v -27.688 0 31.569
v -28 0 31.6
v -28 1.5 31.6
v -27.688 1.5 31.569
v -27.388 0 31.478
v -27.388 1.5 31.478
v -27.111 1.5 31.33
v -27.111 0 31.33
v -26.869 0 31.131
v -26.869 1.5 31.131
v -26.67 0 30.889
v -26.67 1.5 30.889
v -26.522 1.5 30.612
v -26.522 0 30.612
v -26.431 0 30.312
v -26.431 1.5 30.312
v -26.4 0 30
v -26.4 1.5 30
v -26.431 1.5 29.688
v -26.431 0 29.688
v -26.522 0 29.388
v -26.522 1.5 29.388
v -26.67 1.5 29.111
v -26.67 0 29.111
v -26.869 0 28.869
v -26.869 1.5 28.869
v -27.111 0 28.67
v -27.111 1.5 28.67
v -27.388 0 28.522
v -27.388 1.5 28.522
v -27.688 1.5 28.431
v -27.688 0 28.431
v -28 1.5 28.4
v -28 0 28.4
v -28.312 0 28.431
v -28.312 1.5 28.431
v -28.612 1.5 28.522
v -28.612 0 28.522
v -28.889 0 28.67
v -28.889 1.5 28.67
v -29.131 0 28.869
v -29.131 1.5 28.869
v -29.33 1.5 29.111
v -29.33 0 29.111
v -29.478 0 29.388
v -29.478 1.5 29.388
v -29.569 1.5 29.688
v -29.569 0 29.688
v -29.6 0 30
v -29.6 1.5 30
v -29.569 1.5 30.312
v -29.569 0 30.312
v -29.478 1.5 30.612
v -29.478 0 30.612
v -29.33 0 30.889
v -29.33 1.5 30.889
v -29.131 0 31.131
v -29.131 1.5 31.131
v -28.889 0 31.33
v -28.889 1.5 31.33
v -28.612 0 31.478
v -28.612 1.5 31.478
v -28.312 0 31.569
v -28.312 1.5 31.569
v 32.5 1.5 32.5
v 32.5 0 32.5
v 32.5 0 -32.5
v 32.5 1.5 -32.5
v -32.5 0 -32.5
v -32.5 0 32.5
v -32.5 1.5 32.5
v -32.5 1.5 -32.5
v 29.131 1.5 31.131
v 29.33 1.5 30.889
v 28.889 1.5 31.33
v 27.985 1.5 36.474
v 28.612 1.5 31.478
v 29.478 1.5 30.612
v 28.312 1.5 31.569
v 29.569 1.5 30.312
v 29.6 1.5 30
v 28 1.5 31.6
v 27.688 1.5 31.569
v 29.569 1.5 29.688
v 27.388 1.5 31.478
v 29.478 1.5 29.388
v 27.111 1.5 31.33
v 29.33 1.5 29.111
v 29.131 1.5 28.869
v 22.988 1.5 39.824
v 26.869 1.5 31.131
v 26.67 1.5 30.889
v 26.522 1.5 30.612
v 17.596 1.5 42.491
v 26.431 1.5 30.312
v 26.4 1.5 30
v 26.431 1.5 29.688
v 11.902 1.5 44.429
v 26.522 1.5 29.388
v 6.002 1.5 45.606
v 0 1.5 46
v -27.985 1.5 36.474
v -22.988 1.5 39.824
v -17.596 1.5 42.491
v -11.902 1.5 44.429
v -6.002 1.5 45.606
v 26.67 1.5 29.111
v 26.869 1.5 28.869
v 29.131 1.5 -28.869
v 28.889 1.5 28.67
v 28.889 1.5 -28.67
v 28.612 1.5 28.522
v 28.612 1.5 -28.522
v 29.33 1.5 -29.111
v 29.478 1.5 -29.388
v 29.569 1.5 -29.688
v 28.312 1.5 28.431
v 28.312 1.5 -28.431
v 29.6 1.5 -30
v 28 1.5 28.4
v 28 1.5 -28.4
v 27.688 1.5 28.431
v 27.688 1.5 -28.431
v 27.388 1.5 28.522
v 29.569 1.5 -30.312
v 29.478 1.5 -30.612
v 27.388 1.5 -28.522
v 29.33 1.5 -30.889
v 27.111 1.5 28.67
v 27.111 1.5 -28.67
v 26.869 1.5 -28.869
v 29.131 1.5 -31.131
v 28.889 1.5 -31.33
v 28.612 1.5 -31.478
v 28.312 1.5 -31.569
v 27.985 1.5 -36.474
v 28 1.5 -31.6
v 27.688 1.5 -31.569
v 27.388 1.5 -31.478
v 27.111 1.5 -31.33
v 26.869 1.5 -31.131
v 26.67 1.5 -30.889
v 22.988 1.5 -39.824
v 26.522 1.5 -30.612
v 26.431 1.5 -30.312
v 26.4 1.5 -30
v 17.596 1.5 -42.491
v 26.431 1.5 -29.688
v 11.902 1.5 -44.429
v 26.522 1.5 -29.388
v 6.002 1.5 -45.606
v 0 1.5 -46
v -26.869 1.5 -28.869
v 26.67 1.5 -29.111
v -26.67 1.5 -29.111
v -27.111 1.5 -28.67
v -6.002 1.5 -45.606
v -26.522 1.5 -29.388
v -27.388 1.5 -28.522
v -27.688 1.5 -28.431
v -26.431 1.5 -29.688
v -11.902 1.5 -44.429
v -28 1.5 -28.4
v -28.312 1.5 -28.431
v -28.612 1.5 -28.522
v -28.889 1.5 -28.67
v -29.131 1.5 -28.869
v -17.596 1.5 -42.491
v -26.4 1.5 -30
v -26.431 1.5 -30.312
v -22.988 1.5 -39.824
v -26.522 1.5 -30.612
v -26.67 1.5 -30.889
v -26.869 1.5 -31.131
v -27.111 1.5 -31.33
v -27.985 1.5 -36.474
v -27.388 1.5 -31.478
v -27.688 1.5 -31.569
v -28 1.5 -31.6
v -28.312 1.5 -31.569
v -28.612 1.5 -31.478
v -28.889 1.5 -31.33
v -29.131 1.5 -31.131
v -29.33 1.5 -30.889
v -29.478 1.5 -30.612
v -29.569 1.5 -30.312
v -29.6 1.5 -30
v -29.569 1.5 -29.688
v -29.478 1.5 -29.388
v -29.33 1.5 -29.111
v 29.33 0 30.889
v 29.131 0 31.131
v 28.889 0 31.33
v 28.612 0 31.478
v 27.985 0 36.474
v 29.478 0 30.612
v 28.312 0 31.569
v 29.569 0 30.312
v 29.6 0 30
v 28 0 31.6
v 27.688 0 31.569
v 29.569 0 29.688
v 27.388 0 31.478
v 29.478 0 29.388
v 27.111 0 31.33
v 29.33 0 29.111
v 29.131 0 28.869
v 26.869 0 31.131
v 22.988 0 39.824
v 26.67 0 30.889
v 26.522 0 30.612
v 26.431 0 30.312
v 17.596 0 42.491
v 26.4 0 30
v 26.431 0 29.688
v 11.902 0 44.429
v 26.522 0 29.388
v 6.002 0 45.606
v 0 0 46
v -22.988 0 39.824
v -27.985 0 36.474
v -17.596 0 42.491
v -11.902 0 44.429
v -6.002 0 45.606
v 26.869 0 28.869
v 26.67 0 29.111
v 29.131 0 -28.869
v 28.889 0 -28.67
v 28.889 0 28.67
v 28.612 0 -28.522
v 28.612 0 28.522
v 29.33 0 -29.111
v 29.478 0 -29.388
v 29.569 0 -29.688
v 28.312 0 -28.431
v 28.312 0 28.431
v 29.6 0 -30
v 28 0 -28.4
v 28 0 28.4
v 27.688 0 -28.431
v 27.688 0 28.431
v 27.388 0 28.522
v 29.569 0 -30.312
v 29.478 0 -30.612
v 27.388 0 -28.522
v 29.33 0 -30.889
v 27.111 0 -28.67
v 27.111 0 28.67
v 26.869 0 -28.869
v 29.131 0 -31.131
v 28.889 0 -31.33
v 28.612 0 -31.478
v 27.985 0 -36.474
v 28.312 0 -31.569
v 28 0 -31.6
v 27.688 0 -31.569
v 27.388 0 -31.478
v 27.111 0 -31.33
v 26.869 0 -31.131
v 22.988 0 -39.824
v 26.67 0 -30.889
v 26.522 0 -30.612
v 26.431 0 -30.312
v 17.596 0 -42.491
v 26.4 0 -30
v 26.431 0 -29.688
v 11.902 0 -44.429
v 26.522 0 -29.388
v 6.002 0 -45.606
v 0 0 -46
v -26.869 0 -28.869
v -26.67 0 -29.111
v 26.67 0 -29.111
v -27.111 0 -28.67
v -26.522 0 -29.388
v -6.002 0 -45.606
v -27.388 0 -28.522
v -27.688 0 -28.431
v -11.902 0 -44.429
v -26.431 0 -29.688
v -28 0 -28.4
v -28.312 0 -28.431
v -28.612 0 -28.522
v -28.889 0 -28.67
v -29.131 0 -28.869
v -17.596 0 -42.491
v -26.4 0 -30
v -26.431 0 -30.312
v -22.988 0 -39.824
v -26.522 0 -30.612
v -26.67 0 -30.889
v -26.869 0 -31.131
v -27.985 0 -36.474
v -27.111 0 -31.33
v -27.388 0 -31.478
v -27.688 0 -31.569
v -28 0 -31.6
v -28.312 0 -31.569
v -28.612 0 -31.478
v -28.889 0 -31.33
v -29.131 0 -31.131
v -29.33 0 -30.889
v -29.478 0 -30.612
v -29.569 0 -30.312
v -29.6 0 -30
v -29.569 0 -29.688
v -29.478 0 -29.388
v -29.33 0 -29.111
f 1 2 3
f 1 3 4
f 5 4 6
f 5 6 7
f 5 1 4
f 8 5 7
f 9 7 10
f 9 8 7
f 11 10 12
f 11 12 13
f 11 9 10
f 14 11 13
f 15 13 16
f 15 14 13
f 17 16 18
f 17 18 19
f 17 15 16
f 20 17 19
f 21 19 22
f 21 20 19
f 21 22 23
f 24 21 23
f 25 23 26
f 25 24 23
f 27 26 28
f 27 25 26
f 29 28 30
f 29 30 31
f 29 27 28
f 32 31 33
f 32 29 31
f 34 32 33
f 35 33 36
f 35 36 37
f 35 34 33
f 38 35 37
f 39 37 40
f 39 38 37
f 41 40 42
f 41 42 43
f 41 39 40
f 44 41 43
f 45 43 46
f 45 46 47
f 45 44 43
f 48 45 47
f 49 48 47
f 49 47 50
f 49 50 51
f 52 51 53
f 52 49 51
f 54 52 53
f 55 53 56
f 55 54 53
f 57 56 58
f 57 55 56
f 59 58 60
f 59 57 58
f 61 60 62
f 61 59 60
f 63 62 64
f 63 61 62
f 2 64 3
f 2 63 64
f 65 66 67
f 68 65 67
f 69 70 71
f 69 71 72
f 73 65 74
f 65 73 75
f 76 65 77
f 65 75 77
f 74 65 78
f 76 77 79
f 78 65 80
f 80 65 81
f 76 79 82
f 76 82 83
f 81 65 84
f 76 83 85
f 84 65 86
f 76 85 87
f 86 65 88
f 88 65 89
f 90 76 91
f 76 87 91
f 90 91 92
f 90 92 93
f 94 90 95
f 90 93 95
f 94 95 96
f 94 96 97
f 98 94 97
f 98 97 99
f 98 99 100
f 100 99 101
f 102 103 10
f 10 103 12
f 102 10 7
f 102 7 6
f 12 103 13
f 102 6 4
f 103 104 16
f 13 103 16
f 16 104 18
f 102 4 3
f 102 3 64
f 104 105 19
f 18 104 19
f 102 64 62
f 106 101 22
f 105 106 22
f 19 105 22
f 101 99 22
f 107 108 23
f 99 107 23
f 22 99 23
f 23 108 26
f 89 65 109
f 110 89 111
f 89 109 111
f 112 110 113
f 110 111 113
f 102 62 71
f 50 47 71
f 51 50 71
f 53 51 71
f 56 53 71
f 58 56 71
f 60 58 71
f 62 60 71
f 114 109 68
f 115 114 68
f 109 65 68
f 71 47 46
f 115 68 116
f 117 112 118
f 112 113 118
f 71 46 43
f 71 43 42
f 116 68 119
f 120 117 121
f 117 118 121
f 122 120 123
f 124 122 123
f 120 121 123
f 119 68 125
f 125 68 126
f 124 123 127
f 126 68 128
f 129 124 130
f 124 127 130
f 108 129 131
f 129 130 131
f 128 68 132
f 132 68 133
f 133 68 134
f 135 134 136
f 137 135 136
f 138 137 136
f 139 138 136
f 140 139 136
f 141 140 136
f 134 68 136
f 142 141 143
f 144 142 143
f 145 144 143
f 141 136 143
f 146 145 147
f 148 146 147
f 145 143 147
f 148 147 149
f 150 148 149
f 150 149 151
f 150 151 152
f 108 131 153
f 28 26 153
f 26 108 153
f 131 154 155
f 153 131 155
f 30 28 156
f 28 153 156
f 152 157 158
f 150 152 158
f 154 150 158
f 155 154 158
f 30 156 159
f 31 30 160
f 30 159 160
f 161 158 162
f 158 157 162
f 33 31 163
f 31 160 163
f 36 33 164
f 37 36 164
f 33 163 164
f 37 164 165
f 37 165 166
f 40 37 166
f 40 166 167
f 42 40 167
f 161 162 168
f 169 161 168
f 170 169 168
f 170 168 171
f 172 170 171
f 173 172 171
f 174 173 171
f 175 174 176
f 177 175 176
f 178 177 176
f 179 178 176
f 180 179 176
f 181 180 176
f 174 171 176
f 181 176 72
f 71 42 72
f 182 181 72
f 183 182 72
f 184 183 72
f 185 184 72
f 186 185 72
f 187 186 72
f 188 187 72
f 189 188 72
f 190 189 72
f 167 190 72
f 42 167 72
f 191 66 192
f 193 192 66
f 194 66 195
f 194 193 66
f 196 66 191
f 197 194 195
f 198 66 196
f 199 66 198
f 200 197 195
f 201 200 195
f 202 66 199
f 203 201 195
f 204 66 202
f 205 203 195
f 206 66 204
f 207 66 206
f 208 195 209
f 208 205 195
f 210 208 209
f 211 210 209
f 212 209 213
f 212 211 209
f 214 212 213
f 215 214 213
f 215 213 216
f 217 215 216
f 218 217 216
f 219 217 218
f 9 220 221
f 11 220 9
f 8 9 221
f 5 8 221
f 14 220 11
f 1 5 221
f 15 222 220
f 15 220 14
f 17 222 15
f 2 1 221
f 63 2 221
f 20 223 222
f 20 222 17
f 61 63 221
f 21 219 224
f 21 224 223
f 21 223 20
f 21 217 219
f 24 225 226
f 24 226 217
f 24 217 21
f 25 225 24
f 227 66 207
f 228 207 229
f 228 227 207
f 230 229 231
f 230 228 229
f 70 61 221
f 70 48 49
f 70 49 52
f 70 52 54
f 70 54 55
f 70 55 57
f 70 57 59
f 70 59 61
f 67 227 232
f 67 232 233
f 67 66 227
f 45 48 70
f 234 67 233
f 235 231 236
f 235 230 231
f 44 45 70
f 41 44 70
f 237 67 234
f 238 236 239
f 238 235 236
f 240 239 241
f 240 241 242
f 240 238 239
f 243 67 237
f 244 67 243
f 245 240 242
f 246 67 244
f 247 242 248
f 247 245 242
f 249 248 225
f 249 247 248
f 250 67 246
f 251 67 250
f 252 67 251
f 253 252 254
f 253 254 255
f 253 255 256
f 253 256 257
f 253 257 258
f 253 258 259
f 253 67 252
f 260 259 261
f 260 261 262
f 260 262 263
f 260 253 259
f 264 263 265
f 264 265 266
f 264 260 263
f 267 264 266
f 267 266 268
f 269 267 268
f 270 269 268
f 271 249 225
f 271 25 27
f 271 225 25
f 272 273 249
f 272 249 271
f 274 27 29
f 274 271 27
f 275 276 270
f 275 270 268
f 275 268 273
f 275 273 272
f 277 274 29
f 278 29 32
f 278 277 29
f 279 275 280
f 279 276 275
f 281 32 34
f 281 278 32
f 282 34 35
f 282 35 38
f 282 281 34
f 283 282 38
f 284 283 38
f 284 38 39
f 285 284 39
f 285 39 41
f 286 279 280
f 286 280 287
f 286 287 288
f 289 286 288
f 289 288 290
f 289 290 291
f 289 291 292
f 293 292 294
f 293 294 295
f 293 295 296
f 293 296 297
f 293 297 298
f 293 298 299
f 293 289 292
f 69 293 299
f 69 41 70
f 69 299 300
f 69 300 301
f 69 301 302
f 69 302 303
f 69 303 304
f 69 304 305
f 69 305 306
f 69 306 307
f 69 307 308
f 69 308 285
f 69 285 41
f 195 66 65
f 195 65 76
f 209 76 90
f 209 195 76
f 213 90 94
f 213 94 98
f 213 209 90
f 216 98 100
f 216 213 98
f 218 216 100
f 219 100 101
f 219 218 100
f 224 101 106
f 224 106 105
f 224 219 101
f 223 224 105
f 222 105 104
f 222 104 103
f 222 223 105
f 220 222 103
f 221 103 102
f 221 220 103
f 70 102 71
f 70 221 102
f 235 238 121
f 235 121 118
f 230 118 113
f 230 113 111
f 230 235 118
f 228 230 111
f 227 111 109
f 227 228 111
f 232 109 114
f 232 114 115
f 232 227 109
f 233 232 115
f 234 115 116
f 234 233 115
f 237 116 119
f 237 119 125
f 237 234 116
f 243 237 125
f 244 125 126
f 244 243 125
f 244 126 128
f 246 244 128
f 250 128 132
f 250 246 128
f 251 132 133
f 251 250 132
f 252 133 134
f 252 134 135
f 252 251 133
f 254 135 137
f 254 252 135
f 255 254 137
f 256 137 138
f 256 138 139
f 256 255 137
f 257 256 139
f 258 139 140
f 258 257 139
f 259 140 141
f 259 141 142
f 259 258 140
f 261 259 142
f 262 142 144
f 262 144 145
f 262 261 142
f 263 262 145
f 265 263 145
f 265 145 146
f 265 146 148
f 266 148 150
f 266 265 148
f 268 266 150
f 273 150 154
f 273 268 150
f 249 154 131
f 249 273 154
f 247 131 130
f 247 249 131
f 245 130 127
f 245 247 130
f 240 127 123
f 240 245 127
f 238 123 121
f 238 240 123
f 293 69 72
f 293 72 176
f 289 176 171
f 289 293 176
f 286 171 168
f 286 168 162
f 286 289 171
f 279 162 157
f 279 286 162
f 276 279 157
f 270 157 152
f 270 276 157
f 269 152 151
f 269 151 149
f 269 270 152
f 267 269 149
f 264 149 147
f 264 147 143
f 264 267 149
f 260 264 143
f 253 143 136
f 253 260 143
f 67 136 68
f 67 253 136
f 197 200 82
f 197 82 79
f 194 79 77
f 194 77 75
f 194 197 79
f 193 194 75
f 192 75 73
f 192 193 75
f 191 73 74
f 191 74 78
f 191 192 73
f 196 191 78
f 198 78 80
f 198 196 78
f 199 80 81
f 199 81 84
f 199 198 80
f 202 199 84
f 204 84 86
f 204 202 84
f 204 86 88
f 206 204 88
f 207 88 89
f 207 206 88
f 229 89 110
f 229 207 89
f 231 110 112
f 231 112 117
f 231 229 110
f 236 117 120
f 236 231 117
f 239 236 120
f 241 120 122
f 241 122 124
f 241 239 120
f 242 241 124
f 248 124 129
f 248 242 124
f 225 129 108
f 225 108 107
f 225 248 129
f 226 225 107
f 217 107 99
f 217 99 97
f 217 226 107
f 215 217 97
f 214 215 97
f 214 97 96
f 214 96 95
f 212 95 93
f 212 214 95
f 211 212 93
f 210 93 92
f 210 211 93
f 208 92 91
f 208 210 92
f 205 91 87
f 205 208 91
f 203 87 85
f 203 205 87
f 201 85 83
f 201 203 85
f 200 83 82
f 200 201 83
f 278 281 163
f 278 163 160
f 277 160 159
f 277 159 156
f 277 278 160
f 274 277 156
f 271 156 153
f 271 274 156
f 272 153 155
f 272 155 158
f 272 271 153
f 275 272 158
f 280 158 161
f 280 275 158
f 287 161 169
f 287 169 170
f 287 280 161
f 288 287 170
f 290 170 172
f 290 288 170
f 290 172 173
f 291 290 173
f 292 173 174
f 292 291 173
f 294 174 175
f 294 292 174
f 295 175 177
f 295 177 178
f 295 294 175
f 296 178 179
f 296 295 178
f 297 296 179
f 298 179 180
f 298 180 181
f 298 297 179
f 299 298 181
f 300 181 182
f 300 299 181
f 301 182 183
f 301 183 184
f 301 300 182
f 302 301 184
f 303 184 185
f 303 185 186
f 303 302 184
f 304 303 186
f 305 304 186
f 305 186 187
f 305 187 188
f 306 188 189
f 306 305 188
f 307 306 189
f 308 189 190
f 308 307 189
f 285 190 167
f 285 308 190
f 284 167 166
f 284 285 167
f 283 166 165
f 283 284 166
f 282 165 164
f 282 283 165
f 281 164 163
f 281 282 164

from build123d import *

# Parameters (mm, degrees)
SKETCH_1_W      = 65
SKETCH_1_H      = 65
SKETCH_1_R      = 1.6
EXTRUDE_1_DEPTH = 1.5


with BuildPart() as part:
    # Эскиз1 → Бобышка-Вытянуть1 (new body)
    # profile 1 of 3: a face of its own
    with BuildSketch(Plane(origin=(0, 0, 0), x_dir=(1, 0, 0), z_dir=(0, 1, 0))):
        with BuildLine():
            Line((-32.5, -32.5), (32.5, -32.5))
            ThreePointArc((32.5, -32.5), (0, -46), (-32.5, -32.5))
        make_face()
    # profile 2 of 3: a face of its own
    with BuildSketch(Plane(origin=(0, 0, 0), x_dir=(1, 0, 0), z_dir=(0, 1, 0))):
        Rectangle(SKETCH_1_W, SKETCH_1_H)
        with Locations(Location((-28, -30, 0), (0, 0, 270))):
            Circle(SKETCH_1_R, mode=Mode.SUBTRACT)
        with Locations(Location((-28, 30, 0), (0, 0, 270))):
            Circle(SKETCH_1_R, mode=Mode.SUBTRACT)
        with Locations(Location((28, 30, 0), (0, 0, 270))):
            Circle(SKETCH_1_R, mode=Mode.SUBTRACT)
        with Locations(Location((28, -30, 0), (0, 0, 270))):
            Circle(SKETCH_1_R, mode=Mode.SUBTRACT)
    # profile 3 of 3: a face of its own
    with BuildSketch(Plane(origin=(0, 0, 0), x_dir=(1, 0, 0), z_dir=(0, 1, 0))):
        with BuildLine():
            ThreePointArc((-32.5, 32.5), (0, 46), (32.5, 32.5))
            Line((32.5, 32.5), (-32.5, 32.5))
        make_face()
    extrude(amount=EXTRUDE_1_DEPTH)


solid = part.part
